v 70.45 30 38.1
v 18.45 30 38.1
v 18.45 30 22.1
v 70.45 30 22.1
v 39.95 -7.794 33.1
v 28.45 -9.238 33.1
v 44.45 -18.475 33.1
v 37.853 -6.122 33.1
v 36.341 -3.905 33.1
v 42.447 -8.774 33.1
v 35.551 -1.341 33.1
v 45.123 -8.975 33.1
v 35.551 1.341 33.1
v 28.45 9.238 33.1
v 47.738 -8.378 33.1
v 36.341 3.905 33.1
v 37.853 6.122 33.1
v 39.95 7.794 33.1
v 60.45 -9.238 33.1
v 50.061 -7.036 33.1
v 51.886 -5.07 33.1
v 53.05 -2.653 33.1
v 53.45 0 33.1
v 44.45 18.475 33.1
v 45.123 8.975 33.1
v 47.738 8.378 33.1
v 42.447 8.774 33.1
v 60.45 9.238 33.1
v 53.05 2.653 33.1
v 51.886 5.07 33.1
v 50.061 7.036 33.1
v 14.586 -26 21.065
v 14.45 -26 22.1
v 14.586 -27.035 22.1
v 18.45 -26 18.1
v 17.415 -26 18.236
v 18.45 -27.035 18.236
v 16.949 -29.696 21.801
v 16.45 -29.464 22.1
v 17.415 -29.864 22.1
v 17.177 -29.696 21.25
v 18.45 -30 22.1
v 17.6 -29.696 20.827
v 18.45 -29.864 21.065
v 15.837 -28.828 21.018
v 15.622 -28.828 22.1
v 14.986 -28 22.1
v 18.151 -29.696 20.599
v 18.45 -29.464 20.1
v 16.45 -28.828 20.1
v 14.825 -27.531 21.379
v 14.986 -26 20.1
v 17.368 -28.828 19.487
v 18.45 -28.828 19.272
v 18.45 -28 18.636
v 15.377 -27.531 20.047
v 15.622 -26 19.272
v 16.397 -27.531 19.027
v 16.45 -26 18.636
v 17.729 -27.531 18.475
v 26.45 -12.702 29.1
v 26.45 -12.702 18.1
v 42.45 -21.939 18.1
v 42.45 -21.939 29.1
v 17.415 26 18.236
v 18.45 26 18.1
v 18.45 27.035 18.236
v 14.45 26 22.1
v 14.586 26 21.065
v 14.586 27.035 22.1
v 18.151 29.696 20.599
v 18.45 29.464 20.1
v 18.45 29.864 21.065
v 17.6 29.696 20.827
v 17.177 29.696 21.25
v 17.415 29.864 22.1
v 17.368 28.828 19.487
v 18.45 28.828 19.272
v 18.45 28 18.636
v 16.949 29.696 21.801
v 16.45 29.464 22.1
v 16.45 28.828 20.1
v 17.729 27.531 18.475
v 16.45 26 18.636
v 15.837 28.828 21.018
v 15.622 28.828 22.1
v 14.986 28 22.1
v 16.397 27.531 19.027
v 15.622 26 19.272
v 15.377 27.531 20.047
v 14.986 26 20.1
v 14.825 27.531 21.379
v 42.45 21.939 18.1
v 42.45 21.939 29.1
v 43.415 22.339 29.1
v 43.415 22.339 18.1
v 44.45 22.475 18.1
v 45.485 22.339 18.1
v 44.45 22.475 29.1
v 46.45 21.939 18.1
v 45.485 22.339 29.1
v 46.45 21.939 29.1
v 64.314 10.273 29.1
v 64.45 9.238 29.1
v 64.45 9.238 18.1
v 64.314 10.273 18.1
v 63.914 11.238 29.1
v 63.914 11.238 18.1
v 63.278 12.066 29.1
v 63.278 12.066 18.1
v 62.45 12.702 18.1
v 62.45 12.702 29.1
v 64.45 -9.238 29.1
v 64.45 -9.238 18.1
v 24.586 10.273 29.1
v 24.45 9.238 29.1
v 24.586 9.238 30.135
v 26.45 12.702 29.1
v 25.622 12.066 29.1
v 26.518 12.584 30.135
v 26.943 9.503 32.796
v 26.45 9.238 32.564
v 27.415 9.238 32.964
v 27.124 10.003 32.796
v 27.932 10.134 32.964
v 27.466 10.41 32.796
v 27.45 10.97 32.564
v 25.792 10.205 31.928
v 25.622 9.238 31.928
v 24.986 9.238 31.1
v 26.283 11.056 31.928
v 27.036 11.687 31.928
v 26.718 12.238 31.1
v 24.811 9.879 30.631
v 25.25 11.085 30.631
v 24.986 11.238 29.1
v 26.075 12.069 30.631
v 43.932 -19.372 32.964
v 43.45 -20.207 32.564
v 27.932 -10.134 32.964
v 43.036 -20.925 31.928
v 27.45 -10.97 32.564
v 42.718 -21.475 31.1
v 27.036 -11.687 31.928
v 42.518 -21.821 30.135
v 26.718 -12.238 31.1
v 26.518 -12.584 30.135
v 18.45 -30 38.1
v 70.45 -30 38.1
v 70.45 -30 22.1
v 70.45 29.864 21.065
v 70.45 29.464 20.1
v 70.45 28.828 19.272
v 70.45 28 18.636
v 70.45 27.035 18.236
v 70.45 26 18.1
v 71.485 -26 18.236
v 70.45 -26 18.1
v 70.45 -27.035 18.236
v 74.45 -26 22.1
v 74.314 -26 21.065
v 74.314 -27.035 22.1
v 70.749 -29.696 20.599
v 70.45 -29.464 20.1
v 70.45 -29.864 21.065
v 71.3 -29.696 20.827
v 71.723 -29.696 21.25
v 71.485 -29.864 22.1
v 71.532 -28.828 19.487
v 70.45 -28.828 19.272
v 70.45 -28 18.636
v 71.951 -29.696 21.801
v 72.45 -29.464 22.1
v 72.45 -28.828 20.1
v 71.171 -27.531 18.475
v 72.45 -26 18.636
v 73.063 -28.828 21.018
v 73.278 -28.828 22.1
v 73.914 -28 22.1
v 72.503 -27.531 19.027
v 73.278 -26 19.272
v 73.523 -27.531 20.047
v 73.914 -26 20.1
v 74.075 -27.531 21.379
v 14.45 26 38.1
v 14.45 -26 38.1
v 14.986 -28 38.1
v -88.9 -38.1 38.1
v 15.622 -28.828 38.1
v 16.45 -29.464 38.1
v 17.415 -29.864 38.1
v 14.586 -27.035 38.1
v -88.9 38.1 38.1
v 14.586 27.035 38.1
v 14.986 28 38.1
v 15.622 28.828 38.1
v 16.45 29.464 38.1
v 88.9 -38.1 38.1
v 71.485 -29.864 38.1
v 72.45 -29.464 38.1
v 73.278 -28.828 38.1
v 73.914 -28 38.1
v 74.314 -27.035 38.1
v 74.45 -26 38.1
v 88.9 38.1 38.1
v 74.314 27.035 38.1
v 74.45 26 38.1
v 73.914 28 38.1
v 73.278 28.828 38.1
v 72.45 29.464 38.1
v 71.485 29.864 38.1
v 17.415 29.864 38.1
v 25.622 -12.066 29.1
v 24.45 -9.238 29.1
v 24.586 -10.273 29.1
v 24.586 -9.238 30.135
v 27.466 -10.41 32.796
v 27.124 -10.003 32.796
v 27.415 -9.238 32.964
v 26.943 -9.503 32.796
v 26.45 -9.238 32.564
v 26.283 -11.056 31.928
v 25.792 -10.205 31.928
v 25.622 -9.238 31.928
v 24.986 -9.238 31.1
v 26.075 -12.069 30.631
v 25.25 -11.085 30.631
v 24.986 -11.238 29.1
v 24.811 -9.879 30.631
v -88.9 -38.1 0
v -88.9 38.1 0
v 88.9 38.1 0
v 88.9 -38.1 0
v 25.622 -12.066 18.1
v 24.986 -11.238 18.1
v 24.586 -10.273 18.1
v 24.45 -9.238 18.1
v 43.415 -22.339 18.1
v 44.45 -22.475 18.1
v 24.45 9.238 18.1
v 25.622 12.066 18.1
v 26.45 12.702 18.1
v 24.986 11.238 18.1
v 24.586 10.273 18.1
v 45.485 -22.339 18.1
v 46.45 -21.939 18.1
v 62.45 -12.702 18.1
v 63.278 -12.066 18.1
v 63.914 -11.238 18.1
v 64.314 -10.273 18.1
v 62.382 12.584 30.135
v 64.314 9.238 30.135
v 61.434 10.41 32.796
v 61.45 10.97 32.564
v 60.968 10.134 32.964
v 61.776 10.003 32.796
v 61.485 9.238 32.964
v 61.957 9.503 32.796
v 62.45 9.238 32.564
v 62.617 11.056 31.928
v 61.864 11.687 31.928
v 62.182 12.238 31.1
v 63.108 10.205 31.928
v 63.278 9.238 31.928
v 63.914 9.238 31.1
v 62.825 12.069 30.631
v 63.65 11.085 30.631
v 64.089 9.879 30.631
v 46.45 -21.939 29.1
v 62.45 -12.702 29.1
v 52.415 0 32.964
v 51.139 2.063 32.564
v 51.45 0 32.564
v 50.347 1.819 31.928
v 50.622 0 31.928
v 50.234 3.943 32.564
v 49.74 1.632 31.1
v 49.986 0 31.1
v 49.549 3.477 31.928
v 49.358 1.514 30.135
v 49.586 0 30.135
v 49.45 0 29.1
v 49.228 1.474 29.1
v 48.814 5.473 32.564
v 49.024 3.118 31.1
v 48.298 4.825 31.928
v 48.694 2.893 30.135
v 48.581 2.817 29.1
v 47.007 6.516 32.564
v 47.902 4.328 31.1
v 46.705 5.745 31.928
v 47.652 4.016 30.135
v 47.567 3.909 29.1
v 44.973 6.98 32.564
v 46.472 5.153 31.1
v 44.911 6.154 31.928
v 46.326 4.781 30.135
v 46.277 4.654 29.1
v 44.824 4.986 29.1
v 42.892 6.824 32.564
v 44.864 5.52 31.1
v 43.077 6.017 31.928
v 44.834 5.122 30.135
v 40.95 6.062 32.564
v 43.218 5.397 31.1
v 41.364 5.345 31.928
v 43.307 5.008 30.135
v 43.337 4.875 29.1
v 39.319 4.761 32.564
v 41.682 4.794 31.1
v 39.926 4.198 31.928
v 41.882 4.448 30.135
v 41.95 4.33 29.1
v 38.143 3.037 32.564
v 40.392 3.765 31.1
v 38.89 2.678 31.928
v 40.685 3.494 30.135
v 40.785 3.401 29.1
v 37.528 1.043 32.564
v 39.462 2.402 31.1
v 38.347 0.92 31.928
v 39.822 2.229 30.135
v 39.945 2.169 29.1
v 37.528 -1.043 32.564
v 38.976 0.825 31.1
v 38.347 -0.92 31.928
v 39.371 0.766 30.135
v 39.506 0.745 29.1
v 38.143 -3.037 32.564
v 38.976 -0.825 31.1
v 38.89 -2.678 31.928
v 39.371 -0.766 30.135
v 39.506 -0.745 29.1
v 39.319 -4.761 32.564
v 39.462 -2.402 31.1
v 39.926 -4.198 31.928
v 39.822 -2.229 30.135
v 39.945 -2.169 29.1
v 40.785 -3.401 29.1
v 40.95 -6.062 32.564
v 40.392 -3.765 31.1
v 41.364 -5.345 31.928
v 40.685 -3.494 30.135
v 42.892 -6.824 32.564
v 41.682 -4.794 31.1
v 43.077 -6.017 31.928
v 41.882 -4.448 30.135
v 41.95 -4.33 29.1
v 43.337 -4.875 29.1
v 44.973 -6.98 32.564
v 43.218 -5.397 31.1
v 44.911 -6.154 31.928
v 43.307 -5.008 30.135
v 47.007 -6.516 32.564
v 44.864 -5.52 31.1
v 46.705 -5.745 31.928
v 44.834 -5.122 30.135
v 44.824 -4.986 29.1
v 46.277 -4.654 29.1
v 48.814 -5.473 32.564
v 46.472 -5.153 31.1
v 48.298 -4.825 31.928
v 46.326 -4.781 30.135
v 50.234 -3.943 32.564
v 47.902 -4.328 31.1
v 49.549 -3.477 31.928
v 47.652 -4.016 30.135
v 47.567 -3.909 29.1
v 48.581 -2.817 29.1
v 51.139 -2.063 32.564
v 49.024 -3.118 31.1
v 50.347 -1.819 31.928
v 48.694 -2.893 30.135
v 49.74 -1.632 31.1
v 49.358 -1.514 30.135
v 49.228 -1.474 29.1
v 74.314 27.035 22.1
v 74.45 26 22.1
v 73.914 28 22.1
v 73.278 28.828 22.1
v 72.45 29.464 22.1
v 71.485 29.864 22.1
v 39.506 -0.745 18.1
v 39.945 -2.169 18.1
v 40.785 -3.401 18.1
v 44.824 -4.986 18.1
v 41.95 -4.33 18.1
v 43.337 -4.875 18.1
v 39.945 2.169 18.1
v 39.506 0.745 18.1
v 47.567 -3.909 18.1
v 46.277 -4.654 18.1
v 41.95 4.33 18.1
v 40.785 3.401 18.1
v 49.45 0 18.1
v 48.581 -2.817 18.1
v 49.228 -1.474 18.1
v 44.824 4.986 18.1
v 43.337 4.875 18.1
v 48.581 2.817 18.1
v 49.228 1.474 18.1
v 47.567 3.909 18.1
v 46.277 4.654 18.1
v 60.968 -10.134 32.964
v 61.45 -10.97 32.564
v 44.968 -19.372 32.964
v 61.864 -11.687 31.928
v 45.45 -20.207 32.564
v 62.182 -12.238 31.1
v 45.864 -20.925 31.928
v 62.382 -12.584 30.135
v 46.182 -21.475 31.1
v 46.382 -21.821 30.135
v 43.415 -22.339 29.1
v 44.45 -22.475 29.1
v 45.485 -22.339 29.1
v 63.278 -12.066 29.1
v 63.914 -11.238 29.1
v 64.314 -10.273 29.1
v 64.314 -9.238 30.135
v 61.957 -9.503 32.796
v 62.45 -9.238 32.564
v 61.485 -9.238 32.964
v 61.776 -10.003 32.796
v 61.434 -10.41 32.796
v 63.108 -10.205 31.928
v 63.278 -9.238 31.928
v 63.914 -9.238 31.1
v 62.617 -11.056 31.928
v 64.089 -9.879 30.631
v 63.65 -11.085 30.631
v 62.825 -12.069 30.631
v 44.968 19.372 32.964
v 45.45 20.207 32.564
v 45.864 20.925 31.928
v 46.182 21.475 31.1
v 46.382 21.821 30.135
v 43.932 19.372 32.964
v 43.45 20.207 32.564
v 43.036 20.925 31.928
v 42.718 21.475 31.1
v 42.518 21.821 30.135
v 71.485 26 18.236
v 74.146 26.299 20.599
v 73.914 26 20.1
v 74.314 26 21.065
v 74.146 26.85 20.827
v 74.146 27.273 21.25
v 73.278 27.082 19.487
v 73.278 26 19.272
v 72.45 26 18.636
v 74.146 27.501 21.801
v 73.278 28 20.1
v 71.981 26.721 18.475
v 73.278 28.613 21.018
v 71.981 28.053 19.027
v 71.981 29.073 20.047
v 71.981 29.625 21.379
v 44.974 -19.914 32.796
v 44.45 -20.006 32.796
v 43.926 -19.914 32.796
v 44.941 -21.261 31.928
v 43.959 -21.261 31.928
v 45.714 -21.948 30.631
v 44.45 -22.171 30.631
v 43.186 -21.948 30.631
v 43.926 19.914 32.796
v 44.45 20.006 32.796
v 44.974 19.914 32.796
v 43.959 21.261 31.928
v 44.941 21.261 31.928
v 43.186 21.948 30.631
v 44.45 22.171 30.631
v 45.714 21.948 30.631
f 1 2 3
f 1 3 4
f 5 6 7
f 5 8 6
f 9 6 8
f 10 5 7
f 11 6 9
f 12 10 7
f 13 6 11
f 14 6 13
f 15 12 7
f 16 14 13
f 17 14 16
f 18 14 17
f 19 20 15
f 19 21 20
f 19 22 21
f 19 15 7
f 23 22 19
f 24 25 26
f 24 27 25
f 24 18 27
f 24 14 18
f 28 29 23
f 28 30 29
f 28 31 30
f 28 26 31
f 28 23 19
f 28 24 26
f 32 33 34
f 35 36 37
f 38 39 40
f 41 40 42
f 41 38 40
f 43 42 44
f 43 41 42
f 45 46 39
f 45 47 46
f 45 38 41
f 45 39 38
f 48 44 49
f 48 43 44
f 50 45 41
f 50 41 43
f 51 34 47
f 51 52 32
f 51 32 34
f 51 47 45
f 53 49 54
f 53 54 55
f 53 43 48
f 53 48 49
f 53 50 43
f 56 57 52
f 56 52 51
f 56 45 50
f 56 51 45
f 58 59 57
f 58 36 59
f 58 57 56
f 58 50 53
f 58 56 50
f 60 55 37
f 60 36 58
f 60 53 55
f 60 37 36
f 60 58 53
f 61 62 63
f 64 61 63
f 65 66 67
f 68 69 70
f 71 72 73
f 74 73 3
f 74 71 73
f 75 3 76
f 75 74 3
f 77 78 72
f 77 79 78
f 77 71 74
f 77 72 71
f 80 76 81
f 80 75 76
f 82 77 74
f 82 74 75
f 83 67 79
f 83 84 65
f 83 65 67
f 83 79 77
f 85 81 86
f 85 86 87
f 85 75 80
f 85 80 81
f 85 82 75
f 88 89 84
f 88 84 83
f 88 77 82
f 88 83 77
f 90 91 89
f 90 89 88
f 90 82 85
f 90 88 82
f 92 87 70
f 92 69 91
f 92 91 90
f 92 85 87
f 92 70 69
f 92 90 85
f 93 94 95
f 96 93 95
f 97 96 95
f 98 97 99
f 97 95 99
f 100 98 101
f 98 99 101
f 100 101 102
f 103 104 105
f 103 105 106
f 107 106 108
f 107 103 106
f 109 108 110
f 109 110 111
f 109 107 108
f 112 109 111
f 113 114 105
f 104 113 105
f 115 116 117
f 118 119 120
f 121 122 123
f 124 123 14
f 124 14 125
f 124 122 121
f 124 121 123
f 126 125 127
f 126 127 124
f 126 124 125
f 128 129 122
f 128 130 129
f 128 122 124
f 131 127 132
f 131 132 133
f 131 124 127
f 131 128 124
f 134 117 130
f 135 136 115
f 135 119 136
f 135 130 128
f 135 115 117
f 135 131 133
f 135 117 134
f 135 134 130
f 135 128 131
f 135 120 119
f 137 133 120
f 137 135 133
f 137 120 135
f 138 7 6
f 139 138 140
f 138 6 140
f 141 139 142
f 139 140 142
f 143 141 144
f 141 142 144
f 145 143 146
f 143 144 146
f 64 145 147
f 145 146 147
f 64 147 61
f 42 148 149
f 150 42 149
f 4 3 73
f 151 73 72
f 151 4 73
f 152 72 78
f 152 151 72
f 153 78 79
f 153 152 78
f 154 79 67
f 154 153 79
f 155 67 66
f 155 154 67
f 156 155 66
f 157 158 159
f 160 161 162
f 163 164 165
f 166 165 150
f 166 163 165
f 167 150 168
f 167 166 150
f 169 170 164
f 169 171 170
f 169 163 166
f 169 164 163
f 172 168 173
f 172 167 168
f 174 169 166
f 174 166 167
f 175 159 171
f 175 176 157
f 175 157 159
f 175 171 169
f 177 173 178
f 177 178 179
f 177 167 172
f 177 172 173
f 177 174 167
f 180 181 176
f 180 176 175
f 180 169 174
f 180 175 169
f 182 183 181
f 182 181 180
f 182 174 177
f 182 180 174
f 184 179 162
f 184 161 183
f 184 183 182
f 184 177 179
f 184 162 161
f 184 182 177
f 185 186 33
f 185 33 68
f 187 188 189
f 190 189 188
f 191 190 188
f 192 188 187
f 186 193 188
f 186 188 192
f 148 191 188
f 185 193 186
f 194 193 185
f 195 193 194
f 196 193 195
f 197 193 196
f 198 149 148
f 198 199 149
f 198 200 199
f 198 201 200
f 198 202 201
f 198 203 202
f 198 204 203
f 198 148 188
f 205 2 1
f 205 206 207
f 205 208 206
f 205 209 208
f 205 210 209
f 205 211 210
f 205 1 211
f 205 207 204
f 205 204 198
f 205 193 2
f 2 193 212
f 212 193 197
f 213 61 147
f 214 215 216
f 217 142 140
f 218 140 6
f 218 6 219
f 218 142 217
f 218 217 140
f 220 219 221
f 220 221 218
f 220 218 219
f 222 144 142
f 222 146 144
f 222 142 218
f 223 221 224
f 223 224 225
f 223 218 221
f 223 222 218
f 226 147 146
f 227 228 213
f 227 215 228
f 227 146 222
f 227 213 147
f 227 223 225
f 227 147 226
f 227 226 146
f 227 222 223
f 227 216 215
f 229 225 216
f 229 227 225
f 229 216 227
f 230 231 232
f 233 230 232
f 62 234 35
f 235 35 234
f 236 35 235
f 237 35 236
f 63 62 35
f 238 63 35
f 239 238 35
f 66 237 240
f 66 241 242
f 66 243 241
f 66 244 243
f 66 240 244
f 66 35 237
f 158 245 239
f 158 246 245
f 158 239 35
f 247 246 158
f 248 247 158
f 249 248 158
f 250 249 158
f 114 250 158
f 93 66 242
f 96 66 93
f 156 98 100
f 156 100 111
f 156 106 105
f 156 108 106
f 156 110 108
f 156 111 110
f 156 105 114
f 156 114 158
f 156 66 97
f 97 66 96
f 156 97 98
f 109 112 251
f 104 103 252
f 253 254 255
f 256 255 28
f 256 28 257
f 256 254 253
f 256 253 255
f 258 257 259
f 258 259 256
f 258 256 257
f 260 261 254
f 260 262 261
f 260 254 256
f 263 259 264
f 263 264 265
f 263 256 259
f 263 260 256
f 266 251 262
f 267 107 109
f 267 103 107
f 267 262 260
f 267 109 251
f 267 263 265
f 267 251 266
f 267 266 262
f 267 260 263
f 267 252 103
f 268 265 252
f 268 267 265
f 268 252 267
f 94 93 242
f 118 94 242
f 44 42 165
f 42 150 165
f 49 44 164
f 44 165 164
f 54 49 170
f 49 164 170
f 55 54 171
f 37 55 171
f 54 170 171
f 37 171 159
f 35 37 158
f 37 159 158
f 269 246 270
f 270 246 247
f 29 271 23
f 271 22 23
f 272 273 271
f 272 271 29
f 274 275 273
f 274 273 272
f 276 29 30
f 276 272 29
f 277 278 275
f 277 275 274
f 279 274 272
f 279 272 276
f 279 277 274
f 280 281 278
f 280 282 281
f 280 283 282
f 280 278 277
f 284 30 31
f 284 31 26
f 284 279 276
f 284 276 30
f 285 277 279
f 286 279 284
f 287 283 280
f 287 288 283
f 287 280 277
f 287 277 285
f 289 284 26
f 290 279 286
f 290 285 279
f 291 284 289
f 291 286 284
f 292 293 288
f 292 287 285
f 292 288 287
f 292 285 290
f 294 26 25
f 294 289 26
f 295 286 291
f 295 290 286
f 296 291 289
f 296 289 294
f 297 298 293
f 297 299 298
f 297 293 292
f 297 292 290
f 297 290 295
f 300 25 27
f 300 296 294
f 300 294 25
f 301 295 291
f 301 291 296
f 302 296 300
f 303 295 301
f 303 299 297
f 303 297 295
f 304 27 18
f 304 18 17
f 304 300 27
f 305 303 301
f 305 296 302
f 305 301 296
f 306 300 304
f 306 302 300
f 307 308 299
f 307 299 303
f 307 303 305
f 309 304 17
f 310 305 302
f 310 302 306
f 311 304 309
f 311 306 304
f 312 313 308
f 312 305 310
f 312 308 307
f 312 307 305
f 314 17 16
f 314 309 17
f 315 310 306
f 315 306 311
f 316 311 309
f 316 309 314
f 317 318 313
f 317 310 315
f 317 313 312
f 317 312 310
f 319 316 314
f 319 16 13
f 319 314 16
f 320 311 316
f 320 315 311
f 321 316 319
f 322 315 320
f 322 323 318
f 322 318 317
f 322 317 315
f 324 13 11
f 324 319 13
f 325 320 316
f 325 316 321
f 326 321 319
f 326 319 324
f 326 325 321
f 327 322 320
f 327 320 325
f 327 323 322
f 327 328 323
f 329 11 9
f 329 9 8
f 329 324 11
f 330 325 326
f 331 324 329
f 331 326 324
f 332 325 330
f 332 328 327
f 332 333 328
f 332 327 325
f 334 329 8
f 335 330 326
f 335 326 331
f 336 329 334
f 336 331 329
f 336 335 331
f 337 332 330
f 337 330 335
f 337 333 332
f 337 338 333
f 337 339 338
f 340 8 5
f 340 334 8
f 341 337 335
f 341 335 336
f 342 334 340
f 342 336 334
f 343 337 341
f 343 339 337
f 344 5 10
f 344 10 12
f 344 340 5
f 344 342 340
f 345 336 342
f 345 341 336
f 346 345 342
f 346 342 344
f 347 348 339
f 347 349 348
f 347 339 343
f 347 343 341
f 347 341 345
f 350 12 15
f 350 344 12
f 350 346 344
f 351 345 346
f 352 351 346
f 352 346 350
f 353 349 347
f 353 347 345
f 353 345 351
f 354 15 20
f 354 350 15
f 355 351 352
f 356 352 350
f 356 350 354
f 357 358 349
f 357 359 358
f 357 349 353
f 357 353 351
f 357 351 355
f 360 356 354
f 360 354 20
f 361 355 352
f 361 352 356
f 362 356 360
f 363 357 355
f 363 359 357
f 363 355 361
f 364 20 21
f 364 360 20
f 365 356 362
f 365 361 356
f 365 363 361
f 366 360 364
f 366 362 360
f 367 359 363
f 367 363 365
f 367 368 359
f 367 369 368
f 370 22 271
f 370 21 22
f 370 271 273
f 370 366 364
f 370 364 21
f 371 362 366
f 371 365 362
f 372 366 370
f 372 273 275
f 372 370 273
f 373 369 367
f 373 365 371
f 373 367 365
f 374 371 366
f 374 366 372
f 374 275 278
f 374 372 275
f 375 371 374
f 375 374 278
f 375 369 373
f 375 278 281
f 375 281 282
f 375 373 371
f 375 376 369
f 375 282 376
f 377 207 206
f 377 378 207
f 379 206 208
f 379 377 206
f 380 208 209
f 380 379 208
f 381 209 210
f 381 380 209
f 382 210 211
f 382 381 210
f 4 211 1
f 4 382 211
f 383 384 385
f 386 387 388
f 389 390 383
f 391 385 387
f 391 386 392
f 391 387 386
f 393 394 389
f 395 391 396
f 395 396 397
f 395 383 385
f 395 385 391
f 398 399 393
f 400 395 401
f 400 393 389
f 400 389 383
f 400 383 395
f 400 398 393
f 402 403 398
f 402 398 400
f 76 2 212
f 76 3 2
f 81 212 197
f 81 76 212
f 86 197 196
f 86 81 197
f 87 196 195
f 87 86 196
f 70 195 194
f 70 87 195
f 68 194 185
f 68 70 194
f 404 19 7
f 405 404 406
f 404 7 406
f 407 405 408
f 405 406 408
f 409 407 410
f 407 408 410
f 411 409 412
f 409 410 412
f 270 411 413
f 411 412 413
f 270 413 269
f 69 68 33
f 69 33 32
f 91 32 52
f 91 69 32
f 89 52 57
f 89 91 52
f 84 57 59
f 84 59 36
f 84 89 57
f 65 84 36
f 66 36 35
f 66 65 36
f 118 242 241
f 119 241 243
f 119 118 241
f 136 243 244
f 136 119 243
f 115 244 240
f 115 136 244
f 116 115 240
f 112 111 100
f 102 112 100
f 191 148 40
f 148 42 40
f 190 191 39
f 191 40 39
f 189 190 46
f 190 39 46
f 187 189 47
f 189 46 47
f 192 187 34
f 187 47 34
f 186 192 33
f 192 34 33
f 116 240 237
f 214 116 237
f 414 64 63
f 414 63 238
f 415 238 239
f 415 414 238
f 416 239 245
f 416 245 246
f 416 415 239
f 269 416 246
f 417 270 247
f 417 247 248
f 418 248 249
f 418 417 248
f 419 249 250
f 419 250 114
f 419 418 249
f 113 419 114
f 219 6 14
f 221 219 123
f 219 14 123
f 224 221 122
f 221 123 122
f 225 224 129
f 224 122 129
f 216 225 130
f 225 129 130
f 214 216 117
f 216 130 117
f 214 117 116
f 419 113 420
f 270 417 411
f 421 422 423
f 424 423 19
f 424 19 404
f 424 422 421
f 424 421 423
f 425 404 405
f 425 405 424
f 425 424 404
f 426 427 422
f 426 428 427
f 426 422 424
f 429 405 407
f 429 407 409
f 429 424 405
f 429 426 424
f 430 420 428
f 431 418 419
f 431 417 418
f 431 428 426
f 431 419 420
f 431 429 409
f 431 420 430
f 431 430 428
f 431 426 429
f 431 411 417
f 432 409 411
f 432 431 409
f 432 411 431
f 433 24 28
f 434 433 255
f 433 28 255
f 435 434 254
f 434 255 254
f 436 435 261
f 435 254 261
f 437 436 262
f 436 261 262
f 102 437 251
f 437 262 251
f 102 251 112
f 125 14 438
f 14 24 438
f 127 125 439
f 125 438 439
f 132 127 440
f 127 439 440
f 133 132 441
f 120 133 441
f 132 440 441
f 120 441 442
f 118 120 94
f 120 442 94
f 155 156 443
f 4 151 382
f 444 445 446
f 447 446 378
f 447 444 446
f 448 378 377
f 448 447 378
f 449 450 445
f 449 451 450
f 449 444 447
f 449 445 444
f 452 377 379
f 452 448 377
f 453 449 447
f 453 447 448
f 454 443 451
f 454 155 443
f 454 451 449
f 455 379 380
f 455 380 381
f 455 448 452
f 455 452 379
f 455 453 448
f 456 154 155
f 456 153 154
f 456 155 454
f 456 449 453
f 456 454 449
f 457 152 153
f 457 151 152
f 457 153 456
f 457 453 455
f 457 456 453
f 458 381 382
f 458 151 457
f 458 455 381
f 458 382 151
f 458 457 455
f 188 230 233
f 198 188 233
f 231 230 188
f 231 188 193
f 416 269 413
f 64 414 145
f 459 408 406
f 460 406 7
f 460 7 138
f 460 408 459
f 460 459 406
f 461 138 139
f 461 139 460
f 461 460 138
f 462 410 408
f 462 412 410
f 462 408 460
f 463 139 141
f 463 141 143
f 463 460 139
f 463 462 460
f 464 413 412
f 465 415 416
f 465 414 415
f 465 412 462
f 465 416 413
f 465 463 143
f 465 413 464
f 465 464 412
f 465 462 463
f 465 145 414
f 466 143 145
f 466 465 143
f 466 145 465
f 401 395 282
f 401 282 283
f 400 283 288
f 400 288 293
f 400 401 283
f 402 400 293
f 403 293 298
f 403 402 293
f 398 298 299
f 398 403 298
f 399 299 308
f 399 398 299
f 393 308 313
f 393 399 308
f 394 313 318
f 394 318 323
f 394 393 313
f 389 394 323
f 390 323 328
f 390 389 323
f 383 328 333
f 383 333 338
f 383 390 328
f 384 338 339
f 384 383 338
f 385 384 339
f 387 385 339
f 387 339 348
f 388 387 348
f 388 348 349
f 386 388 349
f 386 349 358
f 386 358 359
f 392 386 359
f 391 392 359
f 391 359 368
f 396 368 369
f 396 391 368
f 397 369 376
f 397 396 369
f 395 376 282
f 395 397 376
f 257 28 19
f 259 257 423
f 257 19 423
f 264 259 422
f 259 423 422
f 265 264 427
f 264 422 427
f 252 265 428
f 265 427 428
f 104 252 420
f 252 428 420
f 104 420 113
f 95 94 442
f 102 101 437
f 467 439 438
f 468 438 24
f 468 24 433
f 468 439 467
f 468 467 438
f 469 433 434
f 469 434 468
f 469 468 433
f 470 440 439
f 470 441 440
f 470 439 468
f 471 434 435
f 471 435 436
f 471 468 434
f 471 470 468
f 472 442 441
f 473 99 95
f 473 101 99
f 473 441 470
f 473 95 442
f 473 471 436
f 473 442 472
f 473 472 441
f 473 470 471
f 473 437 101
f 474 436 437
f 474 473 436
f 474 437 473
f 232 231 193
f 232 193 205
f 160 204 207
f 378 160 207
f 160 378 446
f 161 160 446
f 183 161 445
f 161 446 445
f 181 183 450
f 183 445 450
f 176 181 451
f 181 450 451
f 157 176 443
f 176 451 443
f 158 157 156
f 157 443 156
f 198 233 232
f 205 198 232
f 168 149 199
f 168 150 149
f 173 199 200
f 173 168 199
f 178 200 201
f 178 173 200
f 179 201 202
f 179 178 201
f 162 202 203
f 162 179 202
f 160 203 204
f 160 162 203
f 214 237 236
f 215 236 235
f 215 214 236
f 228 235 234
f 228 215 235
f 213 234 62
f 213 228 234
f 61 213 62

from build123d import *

# Parameters (mm, degrees)
CROQUIS1_W              = 177.8
CROQUIS1_H              = 76.2
SALIENTE_EXTRUIR1_DEPTH = 38.1
CROQUIS2_W              = 60
CROQUIS2_H              = 60
CORTAR_EXTRUIR1_DEPTH   = 20
CROQUIS3_R              = 5
SALIENTE_EXTRUIR2_DEPTH = 15
REDONDEO1_R             = 4
REDONDEO3_R             = 4
REDONDEO4_R             = 4
REDONDEO5_R             = 4


with BuildPart() as part:
    # Croquis1 → Saliente-Extruir1 (new body)
    with BuildSketch(Plane.XY):
        Rectangle(CROQUIS1_W, CROQUIS1_H)
    extrude(amount=SALIENTE_EXTRUIR1_DEPTH)

    # Croquis2 → Cortar-Extruir1 (cut)
    with BuildSketch(Plane.XY.offset(38.1)):
        with Locations((44.45, 0)):
            Rectangle(CROQUIS2_W, CROQUIS2_H)
    extrude(amount=-CORTAR_EXTRUIR1_DEPTH, mode=Mode.SUBTRACT)

    # Croquis3 → Saliente-Extruir2 (add)
    with BuildSketch(Plane.XY.offset(18.1)):
        Polygon((44.45, 23.094010768), (24.45, 11.547005384), (24.45, -11.547005384), (44.45, -23.094010768), (64.45, -11.547005384), (64.45, 11.547005384), align=None)
        with Locations((44.45, 0)):
            Circle(CROQUIS3_R, mode=Mode.SUBTRACT)
    extrude(amount=SALIENTE_EXTRUIR2_DEPTH)

    # Redondeo1
    redondeo1_edges = [part.edges().sort_by_distance(p)[0] for p in [
        (14.45, 0, 18.1),
        (14.45, -30, 28.1),
        (44.45, 30, 18.1),
        (14.45, 30, 28.1),
        (74.45, 0, 18.1),
        (74.45, 30, 28.1),
        (44.45, -30, 18.1),
        (74.45, -30, 28.1),
    ]]
    fillet(redondeo1_edges, radius=REDONDEO1_R)

    # Redondeo3
    redondeo3_edges = [part.edges().sort_by_distance(p)[0] for p in [
        (64.45, 11.547005384, 25.6),
        (44.45, 23.094010768, 25.6),
        (24.45, 11.547005384, 25.6),
        (24.45, -11.547005384, 25.6),
        (44.45, -23.094010768, 25.6),
        (64.45, -11.547005384, 25.6),
    ]]
    fillet(redondeo3_edges, radius=REDONDEO3_R)

    # Redondeo4
    redondeo4_edges = [part.edges().sort_by_distance(p)[0] for p in [
        (39.45, 0, 33.1),
    ]]
    fillet(redondeo4_edges, radius=REDONDEO4_R)

    # Redondeo5
    redondeo5_edges = [part.edges().sort_by_distance(p)[0] for p in [
        (44.45, 22.475208614, 33.1),
        (24.985898385, 11.237604307, 33.1),
        (24.985898385, -11.237604307, 33.1),
        (44.45, -22.475208614, 33.1),
        (63.914101615, -11.237604307, 33.1),
        (63.914101615, 11.237604307, 33.1),
        (54.45, 17.320508076, 33.1),
        (64.45, 0, 33.1),
        (34.45, 17.320508076, 33.1),
        (24.45, 0, 33.1),
        (34.45, -17.320508076, 33.1),
        (54.45, -17.320508076, 33.1),
    ]]
    fillet(redondeo5_edges, radius=REDONDEO5_R)


solid = part.part
